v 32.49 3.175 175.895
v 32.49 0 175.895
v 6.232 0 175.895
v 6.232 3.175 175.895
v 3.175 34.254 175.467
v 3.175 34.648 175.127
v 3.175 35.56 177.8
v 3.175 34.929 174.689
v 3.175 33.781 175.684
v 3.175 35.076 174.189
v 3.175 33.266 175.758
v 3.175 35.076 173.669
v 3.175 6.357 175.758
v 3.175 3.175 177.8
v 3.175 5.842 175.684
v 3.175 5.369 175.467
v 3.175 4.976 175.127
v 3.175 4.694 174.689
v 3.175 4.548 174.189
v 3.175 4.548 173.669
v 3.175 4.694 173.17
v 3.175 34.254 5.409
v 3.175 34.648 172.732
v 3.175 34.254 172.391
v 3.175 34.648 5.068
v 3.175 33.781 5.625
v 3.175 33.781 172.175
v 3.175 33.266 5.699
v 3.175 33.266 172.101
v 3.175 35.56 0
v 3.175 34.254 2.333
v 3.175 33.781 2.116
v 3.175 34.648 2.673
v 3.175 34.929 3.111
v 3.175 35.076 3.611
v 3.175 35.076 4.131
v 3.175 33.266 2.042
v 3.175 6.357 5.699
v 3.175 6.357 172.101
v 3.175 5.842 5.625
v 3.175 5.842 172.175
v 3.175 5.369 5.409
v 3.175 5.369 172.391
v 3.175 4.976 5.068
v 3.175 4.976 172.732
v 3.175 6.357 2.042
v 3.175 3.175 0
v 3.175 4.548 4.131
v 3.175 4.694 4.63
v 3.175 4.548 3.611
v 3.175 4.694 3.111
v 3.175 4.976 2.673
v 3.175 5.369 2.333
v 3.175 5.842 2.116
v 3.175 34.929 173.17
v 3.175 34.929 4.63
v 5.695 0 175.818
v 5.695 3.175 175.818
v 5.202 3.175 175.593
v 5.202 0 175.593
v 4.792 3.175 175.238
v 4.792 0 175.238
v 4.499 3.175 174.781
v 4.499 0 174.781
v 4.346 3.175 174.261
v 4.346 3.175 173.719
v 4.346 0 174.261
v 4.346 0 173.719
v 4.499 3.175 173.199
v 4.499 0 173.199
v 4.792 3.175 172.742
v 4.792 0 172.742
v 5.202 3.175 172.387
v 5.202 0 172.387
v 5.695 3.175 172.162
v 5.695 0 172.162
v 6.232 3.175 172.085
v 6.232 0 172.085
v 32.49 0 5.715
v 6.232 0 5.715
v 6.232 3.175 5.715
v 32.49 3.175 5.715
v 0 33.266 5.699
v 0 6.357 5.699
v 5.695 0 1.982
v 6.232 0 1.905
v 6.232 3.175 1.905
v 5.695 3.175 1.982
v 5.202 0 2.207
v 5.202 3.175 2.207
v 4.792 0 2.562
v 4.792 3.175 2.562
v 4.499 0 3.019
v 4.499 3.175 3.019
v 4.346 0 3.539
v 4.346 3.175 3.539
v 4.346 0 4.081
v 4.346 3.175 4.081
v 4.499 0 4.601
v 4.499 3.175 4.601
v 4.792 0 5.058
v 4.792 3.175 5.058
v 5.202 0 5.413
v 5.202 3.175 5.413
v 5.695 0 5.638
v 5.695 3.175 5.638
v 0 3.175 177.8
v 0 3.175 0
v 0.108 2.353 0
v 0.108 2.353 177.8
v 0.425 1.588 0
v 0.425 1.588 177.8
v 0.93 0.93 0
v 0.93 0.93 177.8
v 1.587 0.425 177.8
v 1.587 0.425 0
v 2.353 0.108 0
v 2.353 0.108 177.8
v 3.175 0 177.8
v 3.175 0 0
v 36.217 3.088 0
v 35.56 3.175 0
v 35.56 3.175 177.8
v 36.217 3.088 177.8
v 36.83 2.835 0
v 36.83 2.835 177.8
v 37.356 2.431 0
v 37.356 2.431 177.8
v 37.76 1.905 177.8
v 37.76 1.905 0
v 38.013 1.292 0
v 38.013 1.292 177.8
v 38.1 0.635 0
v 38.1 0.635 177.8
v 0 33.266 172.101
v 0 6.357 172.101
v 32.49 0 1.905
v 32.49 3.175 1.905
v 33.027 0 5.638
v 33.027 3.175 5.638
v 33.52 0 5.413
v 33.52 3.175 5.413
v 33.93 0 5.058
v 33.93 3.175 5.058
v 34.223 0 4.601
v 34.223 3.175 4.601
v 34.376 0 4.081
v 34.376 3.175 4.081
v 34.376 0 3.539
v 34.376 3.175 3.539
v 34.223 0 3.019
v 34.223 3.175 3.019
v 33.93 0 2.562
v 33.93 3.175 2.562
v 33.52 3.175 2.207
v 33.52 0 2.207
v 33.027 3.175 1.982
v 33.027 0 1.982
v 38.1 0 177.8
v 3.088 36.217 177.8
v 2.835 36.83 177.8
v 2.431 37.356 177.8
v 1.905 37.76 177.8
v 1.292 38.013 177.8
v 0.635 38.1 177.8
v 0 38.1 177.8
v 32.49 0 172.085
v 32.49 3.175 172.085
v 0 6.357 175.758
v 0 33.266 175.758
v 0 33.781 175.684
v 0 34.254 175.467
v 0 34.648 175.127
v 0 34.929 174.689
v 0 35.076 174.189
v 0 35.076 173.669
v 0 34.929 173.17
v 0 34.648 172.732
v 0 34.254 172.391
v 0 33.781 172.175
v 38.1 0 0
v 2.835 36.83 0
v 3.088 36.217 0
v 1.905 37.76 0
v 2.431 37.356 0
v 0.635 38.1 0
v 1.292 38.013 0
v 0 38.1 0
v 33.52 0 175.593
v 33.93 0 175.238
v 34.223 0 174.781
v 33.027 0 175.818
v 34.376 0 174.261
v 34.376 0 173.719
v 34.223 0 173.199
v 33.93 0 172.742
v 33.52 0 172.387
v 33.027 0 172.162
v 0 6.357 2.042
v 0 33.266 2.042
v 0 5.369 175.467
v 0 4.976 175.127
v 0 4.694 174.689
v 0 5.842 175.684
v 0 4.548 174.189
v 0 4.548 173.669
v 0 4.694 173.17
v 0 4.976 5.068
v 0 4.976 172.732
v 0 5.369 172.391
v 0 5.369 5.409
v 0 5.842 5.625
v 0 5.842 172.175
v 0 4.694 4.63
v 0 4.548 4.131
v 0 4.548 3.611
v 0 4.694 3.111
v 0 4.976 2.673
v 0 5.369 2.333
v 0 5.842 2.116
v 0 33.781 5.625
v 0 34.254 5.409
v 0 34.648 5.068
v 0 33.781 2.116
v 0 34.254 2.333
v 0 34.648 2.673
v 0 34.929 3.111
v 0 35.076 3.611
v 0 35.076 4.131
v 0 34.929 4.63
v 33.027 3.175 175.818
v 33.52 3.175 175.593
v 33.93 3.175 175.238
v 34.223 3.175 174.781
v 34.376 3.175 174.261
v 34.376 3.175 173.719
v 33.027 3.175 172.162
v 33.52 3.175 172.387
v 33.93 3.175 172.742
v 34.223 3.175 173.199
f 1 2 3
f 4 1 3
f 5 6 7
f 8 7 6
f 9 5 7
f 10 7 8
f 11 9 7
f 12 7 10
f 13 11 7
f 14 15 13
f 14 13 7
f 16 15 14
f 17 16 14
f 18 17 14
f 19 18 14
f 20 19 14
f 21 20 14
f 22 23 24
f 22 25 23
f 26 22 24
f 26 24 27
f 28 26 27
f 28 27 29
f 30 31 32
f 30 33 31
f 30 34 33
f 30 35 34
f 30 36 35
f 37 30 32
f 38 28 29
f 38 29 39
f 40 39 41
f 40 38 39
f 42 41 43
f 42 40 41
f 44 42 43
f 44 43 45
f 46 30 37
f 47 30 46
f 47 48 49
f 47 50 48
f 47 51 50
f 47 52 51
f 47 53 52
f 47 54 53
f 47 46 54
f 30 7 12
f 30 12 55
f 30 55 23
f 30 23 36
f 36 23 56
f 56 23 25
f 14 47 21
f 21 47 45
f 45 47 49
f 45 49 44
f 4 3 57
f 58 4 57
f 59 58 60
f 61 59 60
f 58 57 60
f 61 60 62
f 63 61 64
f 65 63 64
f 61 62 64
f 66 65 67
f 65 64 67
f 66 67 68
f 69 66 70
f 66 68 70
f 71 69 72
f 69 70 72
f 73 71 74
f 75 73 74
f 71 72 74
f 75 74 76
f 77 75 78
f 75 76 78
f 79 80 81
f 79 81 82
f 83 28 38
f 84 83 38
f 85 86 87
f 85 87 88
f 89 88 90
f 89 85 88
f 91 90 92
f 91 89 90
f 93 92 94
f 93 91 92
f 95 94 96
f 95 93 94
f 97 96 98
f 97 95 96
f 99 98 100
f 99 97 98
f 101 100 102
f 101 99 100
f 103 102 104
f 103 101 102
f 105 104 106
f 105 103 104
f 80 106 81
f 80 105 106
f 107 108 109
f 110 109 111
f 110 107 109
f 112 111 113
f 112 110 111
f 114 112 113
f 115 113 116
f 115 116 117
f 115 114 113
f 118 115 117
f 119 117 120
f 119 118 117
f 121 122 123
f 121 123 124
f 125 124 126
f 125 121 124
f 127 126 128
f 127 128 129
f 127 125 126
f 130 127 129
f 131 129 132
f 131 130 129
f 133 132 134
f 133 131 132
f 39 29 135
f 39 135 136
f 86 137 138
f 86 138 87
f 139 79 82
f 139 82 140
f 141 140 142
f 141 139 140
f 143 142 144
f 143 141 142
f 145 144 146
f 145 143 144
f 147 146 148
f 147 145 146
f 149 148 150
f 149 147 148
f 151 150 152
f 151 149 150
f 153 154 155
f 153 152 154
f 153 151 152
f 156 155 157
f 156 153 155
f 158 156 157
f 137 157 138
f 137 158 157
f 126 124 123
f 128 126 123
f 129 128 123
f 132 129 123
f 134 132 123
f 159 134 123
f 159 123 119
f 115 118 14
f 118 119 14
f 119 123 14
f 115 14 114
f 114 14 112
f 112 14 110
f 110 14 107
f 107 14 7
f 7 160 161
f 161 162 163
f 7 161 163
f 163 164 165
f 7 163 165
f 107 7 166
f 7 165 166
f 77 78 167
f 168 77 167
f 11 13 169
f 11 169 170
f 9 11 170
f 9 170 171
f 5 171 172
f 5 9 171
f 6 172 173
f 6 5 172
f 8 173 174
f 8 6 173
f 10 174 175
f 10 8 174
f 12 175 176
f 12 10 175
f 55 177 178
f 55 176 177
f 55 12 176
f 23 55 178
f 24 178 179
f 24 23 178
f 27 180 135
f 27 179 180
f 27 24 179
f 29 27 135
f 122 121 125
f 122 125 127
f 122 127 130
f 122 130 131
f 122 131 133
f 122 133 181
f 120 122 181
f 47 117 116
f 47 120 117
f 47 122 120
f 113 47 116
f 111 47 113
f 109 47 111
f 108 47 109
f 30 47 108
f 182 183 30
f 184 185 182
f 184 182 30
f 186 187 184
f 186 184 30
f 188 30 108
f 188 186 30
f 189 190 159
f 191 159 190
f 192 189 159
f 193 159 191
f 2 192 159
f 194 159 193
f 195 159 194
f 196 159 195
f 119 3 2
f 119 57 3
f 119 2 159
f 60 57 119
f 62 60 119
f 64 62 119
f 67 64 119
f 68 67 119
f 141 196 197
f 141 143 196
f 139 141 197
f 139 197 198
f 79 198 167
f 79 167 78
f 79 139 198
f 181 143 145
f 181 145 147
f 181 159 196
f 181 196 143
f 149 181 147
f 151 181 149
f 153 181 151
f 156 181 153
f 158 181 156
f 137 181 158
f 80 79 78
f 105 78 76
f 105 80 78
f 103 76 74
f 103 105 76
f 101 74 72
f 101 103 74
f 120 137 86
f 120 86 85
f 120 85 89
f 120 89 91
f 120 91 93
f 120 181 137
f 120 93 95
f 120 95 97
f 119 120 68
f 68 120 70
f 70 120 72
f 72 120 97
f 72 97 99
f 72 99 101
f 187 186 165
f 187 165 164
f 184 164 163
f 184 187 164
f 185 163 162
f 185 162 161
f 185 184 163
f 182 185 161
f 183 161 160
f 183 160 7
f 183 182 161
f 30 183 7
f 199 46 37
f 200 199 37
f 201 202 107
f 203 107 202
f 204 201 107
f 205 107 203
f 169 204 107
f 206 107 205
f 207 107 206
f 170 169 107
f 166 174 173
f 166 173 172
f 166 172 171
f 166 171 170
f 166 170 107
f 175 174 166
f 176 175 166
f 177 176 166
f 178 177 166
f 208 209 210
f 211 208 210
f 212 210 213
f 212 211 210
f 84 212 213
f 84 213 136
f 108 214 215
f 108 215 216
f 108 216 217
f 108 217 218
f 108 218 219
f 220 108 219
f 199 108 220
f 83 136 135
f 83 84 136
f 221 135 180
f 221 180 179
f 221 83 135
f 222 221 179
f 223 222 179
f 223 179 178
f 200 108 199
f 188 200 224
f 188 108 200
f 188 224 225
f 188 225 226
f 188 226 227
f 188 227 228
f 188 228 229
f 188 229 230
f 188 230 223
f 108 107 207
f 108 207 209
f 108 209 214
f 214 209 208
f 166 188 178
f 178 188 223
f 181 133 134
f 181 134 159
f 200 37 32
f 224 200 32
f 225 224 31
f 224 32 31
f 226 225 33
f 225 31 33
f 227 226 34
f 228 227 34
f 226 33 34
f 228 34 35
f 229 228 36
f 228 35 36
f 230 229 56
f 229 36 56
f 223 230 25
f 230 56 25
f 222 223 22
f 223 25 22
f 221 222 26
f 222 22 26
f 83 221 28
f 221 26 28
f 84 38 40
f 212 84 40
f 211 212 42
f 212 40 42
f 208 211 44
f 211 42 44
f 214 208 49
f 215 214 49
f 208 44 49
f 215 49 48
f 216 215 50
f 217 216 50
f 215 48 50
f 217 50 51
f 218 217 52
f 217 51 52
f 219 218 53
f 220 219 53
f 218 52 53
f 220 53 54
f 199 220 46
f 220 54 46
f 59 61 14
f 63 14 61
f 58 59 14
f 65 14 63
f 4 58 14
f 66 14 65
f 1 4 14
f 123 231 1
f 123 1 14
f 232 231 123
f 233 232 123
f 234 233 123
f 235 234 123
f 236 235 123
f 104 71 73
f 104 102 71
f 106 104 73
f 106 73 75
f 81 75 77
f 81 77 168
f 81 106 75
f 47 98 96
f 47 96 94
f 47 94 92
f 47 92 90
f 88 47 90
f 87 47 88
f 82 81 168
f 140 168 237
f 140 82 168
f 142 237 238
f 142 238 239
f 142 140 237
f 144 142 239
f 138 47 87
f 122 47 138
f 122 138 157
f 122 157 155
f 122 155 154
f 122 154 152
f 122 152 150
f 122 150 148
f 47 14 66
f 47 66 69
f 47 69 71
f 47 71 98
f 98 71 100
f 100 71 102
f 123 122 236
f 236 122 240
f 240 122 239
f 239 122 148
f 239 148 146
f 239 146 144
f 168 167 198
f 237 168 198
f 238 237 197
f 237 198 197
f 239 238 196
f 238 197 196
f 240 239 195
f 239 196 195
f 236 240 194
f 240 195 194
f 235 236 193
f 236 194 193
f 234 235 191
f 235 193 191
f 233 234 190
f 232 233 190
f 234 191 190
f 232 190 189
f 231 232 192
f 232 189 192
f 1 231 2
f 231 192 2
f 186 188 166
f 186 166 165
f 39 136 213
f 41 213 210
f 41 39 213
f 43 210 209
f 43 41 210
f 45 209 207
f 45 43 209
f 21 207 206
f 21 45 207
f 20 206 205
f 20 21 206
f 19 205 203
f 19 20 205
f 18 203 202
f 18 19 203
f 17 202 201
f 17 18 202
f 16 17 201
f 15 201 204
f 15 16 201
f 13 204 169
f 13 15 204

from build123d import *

# Parameters (mm, degrees)
BOSS_EXTRUDE1_DEPTH = 177.8
FILLET1_R           = 3.175
CUT_EXTRUDE2_DEPTH  = 177.8
CUT_EXTRUDE6_DEPTH  = 177.8


with BuildPart() as part:
    # Sketch1 → Boss-Extrude1 (new body)
    with BuildSketch(Plane.XY):
        with BuildLine():
            Line((0, 0), (0, 38.1))
            Line((0, 38.1), (0.635, 38.1))
            ThreePointArc((0.635, 38.1), (2.431051224, 37.356051224), (3.175, 35.56))
            Line((3.175, 35.56), (3.175, 3.175))
            Line((3.175, 3.175), (35.56, 3.175))
            ThreePointArc((35.56, 3.175), (37.356051224, 2.431051224), (38.1, 0.635))
            Line((38.1, 0.635), (38.1, 0))
            Line((38.1, 0), (0, 0))
        make_face()
    extrude(amount=BOSS_EXTRUDE1_DEPTH)

    # Fillet1
    fillet1_edges = [part.edges().sort_by_distance(p)[0] for p in [
        (0, 0, 88.9),
    ]]
    fillet(fillet1_edges, radius=FILLET1_R)

    # Sketch2 → Cut-Extrude2 (cut)
    with BuildSketch(Plane(origin=(3.175, 0, 0), x_dir=(0, 0, -1), z_dir=(1, 0, 0))):
        with BuildLine():
            Line((-172.101028795, 33.266000832), (-172.101028795, 6.35722327))
            ThreePointArc((-172.101028795, 6.35722327), (-173.92929525, 4.528956814), (-175.757561706, 6.35722327))
            Line((-175.757561706, 6.35722327), (-175.757561706, 33.266000832))
            ThreePointArc((-175.757561706, 33.266000832), (-173.92929525, 35.094267287), (-172.101028795, 33.266000832))
        make_face()
        with BuildLine():
            Line((-5.698971205, 33.266000832), (-5.698971205, 6.35722327))
            ThreePointArc((-5.698971205, 6.35722327), (-3.87070475, 4.528956814), (-2.042438294, 6.35722327))
            Line((-2.042438294, 6.35722327), (-2.042438294, 33.266000832))
            ThreePointArc((-2.042438294, 33.266000832), (-3.87070475, 35.094267287), (-5.698971205, 33.266000832))
        make_face()
    extrude(amount=-CUT_EXTRUDE2_DEPTH, mode=Mode.SUBTRACT)

    # Sketch6 → Cut-Extrude6 (cut)
    with BuildSketch(Plane.XZ):
        with BuildLine():
            Line((32.490336277, 175.895), (6.232036019, 175.895))
            ThreePointArc((6.232036019, 175.895), (4.327036019, 173.99), (6.232036019, 172.085))
            Line((6.232036019, 172.085), (32.490336277, 172.085))
            ThreePointArc((32.490336277, 172.085), (34.395336277, 173.99), (32.490336277, 175.895))
        make_face()
        with BuildLine():
            ThreePointArc((6.232036019, 1.905), (4.327036019, 3.81), (6.232036019, 5.715))
            Line((6.232036019, 5.715), (32.490336277, 5.715))
            ThreePointArc((32.490336277, 5.715), (34.395336277, 3.81), (32.490336277, 1.905))
            Line((32.490336277, 1.905), (6.232036019, 1.905))
        make_face()
    extrude(amount=-CUT_EXTRUDE6_DEPTH, mode=Mode.SUBTRACT)


solid = part.part
